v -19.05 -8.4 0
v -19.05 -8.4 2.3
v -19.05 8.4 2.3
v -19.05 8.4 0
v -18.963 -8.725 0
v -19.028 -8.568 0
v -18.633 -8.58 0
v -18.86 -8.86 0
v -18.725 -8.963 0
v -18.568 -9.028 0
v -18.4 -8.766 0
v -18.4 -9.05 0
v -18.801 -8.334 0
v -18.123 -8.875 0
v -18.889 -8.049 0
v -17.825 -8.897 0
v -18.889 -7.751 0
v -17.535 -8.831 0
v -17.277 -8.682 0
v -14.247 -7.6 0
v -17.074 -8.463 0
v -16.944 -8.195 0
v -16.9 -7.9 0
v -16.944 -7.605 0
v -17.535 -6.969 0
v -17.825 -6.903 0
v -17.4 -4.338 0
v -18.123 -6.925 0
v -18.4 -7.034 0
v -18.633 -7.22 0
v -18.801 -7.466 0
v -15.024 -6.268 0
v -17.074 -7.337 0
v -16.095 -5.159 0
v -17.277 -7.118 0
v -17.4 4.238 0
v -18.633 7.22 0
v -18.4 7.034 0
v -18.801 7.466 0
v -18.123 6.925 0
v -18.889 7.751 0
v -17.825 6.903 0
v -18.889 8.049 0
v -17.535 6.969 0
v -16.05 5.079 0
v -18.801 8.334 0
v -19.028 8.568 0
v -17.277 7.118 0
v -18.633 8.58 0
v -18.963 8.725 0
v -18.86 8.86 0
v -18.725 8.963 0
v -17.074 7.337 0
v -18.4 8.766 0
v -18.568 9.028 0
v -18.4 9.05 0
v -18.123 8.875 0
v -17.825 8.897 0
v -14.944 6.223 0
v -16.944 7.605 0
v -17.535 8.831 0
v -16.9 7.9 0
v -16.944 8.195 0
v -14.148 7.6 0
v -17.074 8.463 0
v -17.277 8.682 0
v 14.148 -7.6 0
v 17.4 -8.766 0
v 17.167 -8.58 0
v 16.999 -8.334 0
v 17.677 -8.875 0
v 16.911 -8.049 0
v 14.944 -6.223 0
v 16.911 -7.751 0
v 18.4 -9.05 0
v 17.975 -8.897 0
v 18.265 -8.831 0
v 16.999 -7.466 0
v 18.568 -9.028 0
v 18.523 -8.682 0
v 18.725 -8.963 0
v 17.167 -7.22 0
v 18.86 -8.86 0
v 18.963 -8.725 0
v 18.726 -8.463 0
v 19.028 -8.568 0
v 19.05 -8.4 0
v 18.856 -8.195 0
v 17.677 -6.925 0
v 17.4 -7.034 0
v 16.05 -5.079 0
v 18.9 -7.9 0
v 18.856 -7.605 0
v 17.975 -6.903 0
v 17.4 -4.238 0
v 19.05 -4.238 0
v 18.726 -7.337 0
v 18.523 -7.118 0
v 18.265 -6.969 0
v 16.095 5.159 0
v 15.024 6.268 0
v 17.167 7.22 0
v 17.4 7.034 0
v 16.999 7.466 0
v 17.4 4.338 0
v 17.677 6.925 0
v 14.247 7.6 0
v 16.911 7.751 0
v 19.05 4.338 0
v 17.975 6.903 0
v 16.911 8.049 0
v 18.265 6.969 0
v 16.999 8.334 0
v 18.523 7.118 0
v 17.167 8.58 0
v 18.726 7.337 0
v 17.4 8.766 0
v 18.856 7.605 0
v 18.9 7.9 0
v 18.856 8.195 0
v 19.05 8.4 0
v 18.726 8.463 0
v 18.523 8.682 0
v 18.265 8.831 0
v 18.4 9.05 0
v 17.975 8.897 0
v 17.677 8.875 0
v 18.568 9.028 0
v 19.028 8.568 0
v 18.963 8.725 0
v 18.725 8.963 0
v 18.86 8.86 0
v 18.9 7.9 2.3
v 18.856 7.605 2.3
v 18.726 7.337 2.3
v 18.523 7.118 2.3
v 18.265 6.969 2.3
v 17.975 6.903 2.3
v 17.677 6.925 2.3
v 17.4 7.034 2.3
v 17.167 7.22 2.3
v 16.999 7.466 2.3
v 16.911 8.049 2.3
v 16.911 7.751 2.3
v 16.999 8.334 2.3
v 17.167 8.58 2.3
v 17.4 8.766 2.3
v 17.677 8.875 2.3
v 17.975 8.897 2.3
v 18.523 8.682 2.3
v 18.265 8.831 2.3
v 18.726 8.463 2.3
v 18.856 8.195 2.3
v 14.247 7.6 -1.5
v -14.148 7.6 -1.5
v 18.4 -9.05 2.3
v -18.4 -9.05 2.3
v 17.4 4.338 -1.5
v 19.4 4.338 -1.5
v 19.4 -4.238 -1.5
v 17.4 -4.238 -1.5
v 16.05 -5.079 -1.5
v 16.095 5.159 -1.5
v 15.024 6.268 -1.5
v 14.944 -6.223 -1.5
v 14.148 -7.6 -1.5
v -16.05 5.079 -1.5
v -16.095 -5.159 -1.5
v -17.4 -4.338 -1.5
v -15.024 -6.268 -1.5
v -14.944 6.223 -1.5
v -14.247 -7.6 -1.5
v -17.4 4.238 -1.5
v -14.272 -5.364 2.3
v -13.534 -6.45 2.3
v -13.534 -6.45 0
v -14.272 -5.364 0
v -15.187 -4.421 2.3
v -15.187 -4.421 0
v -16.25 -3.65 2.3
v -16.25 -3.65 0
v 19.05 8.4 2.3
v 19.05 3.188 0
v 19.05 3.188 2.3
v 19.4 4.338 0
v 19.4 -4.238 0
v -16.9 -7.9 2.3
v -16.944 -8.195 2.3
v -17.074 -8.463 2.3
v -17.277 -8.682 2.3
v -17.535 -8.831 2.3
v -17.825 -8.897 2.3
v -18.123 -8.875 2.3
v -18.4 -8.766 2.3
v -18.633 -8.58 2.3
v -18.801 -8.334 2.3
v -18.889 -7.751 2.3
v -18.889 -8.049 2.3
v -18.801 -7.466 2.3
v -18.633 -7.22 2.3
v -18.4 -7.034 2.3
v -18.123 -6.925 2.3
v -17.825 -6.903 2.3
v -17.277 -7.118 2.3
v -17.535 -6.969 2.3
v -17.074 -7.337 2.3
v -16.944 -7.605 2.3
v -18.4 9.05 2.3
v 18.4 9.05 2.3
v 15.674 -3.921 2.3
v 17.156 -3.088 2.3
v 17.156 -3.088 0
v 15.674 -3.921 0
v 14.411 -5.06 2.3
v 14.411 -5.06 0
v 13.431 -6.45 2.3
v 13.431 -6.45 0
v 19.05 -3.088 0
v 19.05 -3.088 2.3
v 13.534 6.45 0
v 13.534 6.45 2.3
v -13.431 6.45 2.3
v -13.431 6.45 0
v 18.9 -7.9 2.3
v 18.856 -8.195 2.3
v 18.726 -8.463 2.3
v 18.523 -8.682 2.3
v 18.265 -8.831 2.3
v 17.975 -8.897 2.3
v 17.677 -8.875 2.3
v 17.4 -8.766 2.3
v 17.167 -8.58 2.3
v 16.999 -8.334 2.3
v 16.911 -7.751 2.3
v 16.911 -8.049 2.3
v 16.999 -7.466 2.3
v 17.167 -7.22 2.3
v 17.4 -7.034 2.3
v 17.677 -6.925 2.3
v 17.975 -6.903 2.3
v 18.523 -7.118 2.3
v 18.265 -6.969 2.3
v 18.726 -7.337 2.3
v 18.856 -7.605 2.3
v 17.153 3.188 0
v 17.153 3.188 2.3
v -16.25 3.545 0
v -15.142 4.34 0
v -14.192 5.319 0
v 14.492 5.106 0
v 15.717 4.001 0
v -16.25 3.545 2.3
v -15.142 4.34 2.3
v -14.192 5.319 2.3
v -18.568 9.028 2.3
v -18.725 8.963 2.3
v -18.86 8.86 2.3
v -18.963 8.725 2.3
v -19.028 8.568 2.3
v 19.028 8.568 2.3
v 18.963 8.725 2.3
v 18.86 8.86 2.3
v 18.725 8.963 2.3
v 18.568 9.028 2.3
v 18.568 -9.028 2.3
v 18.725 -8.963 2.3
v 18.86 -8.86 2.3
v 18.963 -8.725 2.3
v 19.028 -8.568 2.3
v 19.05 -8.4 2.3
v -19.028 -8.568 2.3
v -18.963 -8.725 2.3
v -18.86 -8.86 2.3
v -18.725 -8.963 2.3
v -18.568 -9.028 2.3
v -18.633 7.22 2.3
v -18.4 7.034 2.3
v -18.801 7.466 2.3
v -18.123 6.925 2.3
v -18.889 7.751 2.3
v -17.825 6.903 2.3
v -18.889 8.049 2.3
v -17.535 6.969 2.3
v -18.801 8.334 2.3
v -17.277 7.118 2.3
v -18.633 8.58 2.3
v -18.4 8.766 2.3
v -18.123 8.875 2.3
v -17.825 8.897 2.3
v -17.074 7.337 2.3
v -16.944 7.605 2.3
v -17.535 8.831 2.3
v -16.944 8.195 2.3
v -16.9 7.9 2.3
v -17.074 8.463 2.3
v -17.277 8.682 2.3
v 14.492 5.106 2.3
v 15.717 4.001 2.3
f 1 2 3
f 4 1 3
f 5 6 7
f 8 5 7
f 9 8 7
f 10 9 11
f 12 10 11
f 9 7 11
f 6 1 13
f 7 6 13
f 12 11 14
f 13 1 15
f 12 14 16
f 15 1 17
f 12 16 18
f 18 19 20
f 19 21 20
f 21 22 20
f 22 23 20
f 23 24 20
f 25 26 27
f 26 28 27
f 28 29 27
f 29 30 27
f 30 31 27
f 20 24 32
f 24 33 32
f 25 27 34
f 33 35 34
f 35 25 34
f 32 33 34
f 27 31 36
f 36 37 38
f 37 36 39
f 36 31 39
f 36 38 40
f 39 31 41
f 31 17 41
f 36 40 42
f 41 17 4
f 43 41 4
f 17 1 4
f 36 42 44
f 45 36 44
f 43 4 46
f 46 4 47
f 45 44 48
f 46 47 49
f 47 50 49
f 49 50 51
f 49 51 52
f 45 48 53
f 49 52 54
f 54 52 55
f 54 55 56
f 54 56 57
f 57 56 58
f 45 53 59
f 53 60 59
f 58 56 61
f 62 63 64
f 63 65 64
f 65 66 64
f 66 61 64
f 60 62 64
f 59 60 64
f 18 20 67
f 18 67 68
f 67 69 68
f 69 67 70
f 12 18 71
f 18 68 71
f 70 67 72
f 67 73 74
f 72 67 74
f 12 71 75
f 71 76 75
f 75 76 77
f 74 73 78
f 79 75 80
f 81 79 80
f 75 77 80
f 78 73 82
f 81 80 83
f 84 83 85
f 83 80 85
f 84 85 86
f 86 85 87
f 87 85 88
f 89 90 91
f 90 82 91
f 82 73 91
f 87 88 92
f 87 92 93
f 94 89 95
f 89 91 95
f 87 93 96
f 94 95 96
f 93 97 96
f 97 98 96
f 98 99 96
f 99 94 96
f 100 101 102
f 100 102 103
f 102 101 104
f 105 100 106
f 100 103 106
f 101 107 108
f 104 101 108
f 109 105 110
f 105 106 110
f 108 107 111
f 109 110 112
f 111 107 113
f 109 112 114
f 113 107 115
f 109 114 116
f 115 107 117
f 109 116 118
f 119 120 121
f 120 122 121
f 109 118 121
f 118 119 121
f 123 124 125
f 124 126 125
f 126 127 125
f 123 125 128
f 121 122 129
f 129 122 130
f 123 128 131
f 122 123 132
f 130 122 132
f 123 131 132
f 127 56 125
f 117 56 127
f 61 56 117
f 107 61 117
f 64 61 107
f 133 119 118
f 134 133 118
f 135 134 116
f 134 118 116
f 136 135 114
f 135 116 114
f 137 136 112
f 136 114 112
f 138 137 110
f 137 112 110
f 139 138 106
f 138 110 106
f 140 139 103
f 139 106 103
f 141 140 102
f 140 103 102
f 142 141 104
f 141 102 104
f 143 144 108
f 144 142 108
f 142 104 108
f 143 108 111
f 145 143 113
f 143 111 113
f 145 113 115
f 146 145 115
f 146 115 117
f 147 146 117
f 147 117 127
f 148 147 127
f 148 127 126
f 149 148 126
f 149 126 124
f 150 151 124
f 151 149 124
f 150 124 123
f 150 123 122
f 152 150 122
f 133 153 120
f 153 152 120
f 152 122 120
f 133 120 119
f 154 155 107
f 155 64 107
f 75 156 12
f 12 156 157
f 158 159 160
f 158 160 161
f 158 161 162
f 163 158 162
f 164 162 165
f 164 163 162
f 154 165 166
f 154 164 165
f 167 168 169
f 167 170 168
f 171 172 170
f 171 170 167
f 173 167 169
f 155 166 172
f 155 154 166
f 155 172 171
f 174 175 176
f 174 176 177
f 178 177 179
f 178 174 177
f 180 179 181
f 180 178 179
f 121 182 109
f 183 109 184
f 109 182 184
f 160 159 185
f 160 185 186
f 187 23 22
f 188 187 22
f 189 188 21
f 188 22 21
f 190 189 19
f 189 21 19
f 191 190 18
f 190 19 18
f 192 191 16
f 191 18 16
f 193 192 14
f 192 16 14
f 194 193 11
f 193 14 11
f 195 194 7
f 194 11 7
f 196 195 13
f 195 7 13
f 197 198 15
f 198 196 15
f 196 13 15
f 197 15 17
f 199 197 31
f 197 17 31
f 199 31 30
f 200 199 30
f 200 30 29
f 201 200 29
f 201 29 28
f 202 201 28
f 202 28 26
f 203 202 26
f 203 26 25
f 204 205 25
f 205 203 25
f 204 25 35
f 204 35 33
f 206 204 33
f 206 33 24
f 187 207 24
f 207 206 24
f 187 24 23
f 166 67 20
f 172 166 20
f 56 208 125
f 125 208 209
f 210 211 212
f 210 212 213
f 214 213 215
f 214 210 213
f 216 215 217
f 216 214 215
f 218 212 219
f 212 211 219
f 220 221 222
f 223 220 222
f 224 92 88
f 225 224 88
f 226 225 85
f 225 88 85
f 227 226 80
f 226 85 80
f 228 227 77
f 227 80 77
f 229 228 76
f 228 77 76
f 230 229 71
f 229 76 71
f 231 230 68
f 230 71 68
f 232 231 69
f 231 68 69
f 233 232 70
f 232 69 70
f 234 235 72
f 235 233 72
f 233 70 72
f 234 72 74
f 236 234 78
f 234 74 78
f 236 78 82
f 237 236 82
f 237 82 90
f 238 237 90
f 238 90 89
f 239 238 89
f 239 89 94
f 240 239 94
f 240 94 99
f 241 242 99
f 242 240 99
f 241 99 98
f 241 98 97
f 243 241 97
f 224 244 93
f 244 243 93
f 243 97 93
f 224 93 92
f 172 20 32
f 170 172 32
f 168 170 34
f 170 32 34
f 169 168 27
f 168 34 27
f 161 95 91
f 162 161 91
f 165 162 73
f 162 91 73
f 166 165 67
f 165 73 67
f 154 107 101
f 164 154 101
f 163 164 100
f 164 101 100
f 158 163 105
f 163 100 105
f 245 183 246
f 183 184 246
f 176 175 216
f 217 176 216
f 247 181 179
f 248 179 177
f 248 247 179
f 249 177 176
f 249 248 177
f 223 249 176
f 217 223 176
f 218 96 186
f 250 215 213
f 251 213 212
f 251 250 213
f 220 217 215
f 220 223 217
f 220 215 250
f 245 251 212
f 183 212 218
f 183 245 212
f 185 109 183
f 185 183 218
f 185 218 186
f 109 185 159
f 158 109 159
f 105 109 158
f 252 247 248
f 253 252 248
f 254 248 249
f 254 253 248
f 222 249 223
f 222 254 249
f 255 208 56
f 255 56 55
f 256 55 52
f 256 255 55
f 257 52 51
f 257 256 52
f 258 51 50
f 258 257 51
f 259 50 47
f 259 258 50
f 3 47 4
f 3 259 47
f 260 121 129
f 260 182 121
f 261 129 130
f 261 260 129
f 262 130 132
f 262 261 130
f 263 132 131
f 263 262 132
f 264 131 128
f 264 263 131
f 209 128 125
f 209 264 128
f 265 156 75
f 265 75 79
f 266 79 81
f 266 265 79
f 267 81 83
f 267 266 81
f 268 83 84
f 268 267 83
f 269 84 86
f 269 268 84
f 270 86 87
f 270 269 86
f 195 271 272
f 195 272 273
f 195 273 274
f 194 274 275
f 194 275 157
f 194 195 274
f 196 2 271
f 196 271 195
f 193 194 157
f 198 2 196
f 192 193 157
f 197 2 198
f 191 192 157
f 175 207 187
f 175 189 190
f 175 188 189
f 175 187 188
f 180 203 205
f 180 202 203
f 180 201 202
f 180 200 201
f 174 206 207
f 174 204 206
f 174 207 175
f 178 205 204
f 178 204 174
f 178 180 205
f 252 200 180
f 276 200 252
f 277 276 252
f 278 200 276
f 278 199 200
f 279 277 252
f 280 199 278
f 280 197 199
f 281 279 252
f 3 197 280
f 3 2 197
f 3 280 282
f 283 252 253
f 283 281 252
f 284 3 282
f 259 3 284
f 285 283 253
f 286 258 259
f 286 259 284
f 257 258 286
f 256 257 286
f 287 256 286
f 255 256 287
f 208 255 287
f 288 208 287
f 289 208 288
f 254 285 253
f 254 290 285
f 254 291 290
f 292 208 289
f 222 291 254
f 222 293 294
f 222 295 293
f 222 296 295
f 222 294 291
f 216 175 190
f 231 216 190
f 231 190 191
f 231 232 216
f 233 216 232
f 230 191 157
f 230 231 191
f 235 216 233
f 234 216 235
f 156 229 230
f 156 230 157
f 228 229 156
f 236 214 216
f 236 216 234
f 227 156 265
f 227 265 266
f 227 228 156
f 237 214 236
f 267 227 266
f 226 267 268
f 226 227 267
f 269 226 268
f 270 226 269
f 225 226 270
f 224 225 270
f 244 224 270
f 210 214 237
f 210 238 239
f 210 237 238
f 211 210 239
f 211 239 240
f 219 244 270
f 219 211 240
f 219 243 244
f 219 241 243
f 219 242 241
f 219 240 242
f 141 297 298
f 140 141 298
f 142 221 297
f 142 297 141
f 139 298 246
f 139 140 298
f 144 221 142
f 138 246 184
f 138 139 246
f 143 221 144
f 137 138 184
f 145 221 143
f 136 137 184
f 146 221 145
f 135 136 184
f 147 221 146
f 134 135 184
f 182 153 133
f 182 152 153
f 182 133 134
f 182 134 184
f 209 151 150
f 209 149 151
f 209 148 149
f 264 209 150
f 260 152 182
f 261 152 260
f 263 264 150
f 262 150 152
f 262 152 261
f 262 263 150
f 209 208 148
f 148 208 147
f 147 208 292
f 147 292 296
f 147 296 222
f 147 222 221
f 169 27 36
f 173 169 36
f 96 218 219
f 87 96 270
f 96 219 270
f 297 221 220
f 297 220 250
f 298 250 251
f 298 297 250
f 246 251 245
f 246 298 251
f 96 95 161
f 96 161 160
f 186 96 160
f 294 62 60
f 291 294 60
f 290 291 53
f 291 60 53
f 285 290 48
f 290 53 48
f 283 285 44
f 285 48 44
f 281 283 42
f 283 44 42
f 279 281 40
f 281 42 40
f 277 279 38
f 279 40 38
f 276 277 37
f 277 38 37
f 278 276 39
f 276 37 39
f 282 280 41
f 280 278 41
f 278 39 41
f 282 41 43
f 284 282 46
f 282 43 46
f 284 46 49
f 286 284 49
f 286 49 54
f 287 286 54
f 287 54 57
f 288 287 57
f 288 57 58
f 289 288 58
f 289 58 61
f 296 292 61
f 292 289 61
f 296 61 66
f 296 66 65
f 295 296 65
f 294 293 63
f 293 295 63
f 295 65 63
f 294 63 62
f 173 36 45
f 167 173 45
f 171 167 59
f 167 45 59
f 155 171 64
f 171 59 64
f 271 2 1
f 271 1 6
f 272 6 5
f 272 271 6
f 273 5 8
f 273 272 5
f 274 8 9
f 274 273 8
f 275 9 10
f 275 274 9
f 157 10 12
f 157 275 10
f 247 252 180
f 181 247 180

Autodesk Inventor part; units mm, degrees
ref_plane "YZ Plane" through (0, 0, 0) normal (1, 0, 0) x (0, 1, 0)
ref_plane "XZ Plane" through (0, 0, 0) normal (0, 1, 0) x (-1, 0, 0)
sketch "Sketch1" plane through (0, 0, 0) normal (0, 0, 1) x (1, 0, 0)
  line L0 (17.4, 4.3375) -> (19.4, 4.3375) projected
  line L1 (19.4, 8.4) -> (19.4, 4.3375) projected
  arc A0 (19.4, 8.4) -> (18.4, 9.4) centre (18.4, 8.4) ccw projected
  line L2 (-18.4, 9.4) -> (18.4, 9.4) projected
  arc A1 (-18.4, 9.4) -> (-19.4, 8.4) centre (-18.4, 8.4) ccw projected
  line L3 (-19.4, -8.4) -> (-19.4, 8.4) projected
  arc A2 (-19.4, -8.4) -> (-18.4, -9.4) centre (-18.4, -8.4) ccw projected
  line L4 (18.4, -9.4) -> (-18.4, -9.4) projected
  arc A3 (18.4, -9.4) -> (19.4, -8.4) centre (18.4, -8.4) ccw projected
  line L5 (19.4, -4.2375) -> (19.4, -8.4) projected
  line L6 (19.4, -4.2375) -> (17.4, -4.2375) projected
  arc A4 (17.4, -4.2375) -> (14.1485, -7.6) centre (20.15, -10.15) ccw projected
  line L7 (14.1485, -7.6) -> (-14.247, -7.6) projected
  arc A5 (-14.247, -7.6) -> (-17.4, -4.3375) centre (-20.15, -10.15) ccw projected
  line L8 (-17.4, -4.3375) -> (-17.4, 4.2375) projected
  arc A6 (-17.4, 4.2375) -> (-14.1485, 7.6) centre (-20.15, 10.15) ccw projected
  line L9 (-14.1485, 7.6) -> (14.247, 7.6) projected
  arc A7 (14.247, 7.6) -> (17.4, 4.3375) centre (20.15, 10.15) ccw projected
  circle A8 centre (-17.9, -7.9) radius 1 projected
  circle A9 centre (17.9, -7.9) radius 1 projected
  circle A10 centre (-17.9, 7.9) radius 1 projected
  circle A11 centre (17.9, 7.9) radius 1 projected
  line L10 (19.4, -2.5) -> (19.4, 2.5) projected
  line L11 (19.4, 8.4) -> (19.4, 2.5) projected
  line L12 (19.4, -2.5) -> (19.4, -8.4) projected
  point P0 (0, 0)
ref_plane "Work Plane1" through (-26.7016, -22.7609, 2.3) normal (0, 0, 1) x (1, 0, 0)
extrude "Extrusion1" add sketch "Sketch1" along normal up to surface (2.3 mm away) contours A7 L9 A6 L8 A5 L7 A4 L6 L5 A3 L4 A2 L3 A1 L2 A0 L1 L0
sketch "Sketch2" plane through (0, 0, 0) normal (0, 0, -1) x (-1, 0, 0)
  arc A0 (14.1485, 7.6) -> (17.4, 4.2375) centre (20.15, 10.15) ccw projected
  line L0 (17.4, -4.3375) -> (17.4, 4.2375) projected
  arc A1 (17.4, -4.3375) -> (14.247, -7.6) centre (20.15, -10.15) ccw projected
  line L1 (-14.1485, -7.6) -> (14.247, -7.6) projected
  arc A2 (-14.1485, -7.6) -> (-17.4, -4.2375) centre (-20.15, -10.15) ccw projected
  line L2 (-17.4, -4.2375) -> (-19.4, -4.2375) projected
  line L3 (-19.4, -4.2375) -> (-19.4, 4.3375) projected
  line L4 (-19.4, 4.3375) -> (-17.4, 4.3375) projected
  arc A3 (-17.4, 4.3375) -> (-14.247, 7.6) centre (-20.15, 10.15) ccw projected
  line L5 (14.1485, 7.6) -> (-14.247, 7.6) projected
  point P0 (0, 0)
extrude "Extrusion2" add sketch "Sketch2" along normal blind 1.5
sketch "Sketch3" plane through (0, 0, 0) normal (0, 0, 1) x (1, 0, 0)
  line L0 (19.4, 4.3375) -> (19.4, -4.2375) projected
  line L1 (17.4, 4.3375) -> (19.4, 4.3375) projected
  arc A0 (14.247, 7.6) -> (17.4, 4.3375) centre (20.15, 10.15) ccw projected
  line L2 (-14.1485, 7.6) -> (14.247, 7.6) projected
  arc A1 (-17.4, 4.2375) -> (-14.1485, 7.6) centre (-20.15, 10.15) ccw projected
  line L3 (-17.4, -4.3375) -> (-17.4, 4.2375) projected
  arc A2 (-14.247, -7.6) -> (-17.4, -4.3375) centre (-20.15, -10.15) ccw projected
  line L4 (14.1485, -7.6) -> (-14.247, -7.6) projected
  arc A3 (17.4, -4.2375) -> (14.1485, -7.6) centre (20.15, -10.15) ccw projected
  line L5 (19.4, -4.2375) -> (17.4, -4.2375) projected
  arc A4 (13.332, 6.1) -> (17.0815, 2.8375) centre (20.15, 10.15) ccw
  line L6 (17.0815, 2.8375) -> (17.9, 2.8375)
  line L7 (17.9, 2.8375) -> (17.9, -2.7375)
  line L8 (17.9, -2.7375) -> (17.0861, -2.7375)
  arc A5 (17.0861, -2.7375) -> (13.2269, -6.1) centre (20.15, -10.15) ccw
  line L9 (13.2269, -6.1) -> (-13.332, -6.1)
  arc A6 (-13.332, -6.1) -> (-15.9, -3.4548) centre (-20.15, -10.15) ccw
  line L10 (-15.9, -3.4548) -> (-15.9, 3.3478)
  arc A7 (-15.9, 3.3478) -> (-13.2269, 6.1) centre (-20.15, 10.15) ccw
  line L11 (-13.2269, 6.1) -> (13.332, 6.1)
  line L12 (17.9, 2.8375) -> (19.4, 2.8375)
  line L13 (19.4, 2.8375) -> (19.4, -2.7375)
  line L14 (19.4, -2.7375) -> (17.9, -2.7375)
  line L15 (17.9, -2.7375) -> (17.9, 2.8375)
  point P0 (0, 0)
  dimension "d4" = 1.5
  dimension "d5" = 5.575
extrude "Extrusion3" add sketch "Sketch3" along normal up to surface (2.3 mm away) contours L0 L12 L6 A4 L11 A7 L10 A6 L9 A5 L8 L14 L5 A3 L4 A2 L3 A1 L2 A0 L1
sketch "Sketch4" plane through (-18.4, 9.4, 2.3) normal (0, 0, 1) x (1, 0, 0)
  line L0 (37.8, -12.1375) -> (37.8, -17.8) projected
  line L1 (35.4861, -12.1375) -> (37.8, -12.1375) projected
  arc A0 (35.4861, -12.1375) -> (31.6269, -15.5) centre (38.55, -19.55) ccw projected
  line L2 (5.068, -15.5) -> (31.6269, -15.5) projected
  arc A1 (5.068, -15.5) -> (2.5, -12.8548) centre (-1.75, -19.55) ccw projected
  line L3 (2.5, -6.0522) -> (2.5, -12.8548) projected
  arc A2 (2.5, -6.0522) -> (5.1731, -3.3) centre (-1.75, 0.75) ccw projected
  line L4 (31.732, -3.3) -> (5.1731, -3.3) projected
  arc A3 (31.732, -3.3) -> (35.4815, -6.5625) centre (38.55, 0.75) ccw projected
  line L5 (37.8, -6.5625) -> (35.4815, -6.5625) projected
  line L6 (37.8, -1) -> (37.8, -6.5625) projected
  arc A4 (37.8, -1) -> (36.8, 0) centre (36.8, -1) ccw projected
  line L7 (0, 0) -> (36.8, 0) projected
  arc A5 (0, 0) -> (-1, -1) centre (0, -1) ccw projected
  line L8 (-1, -17.8) -> (-1, -1) projected
  arc A6 (-1, -17.8) -> (0, -18.8) centre (0, -17.8) ccw projected
  line L9 (36.8, -18.8) -> (0, -18.8) projected
  arc A7 (36.8, -18.8) -> (37.8, -17.8) centre (36.8, -17.8) ccw projected
  arc A8 (37.45, -1) -> (36.8, -0.35) centre (36.8, -1) ccw
  line L10 (37.45, -1) -> (37.45, -6.2125)
  line L11 (37.45, -6.2125) -> (35.5528, -6.2125)
  arc A9 (31.9342, -2.95) -> (35.5528, -6.2125) centre (38.55, 0.75) ccw
  line L12 (31.9342, -2.95) -> (4.9694, -2.95)
  arc A10 (2.15, -5.8553) -> (4.9694, -2.95) centre (-1.75, 0.75) ccw
  line L13 (2.15, -5.8553) -> (2.15, -13.05)
  arc A11 (4.8658, -15.85) -> (2.15, -13.05) centre (-1.75, -19.55) ccw
  line L14 (4.8658, -15.85) -> (31.8306, -15.85)
  arc A12 (35.5564, -12.4875) -> (31.8306, -15.85) centre (38.55, -19.55) ccw
  line L15 (35.5564, -12.4875) -> (37.45, -12.4875)
  line L16 (37.45, -12.4875) -> (37.45, -17.8)
  arc A13 (36.8, -18.45) -> (37.45, -17.8) centre (36.8, -17.8) ccw
  line L17 (36.8, -18.45) -> (0, -18.45)
  arc A14 (-0.65, -17.8) -> (0, -18.45) centre (0, -17.8) ccw
  line L18 (-0.65, -17.8) -> (-0.65, -1)
  arc A15 (0, -0.35) -> (-0.65, -1) centre (0, -1) ccw
  line L19 (0, -0.35) -> (36.8, -0.35)
  line L20 (37.45, -6.2125) -> (37.45, -12.4875)
  line L21 (37.8, -6.5625) -> (37.8, -12.1375) projected
  line L22 (37.8, -6.2125) -> (37.8, -1)
  arc A16 (37.8, -1) -> (36.8, 0) centre (36.8, -1) ccw
  line L23 (36.8, 0) -> (0, 0)
  arc A17 (0, 0) -> (-1, -1) centre (0, -1) ccw
  line L24 (-1, -1) -> (-1, -17.8)
  arc A18 (-1, -17.8) -> (0, -18.8) centre (0, -17.8) ccw
  line L25 (0, -18.8) -> (36.8, -18.8)
  arc A19 (36.8, -18.8) -> (37.8, -17.8) centre (36.8, -17.8) ccw
  line L26 (37.8, -17.8) -> (37.8, -12.4875)
  line L27 (37.8, -6.2125) -> (37.8, -12.4875)
  line L28 (-1, 0) -> (37.8, 0)
  line L29 (37.8, 0) -> (37.8, -18.8)
  line L30 (37.8, -18.8) -> (-1, -18.8)
  line L31 (-1, -18.8) -> (-1, 0)
  line L32 (-0.65, -0.35) -> (37.45, -0.35)
  line L33 (37.45, -0.35) -> (37.45, -18.45)
  line L34 (37.45, -18.45) -> (-0.65, -18.45)
  line L35 (-0.65, -18.45) -> (-0.65, -0.35)
  point P0 (18.4, -9.4)
  dimension "d8" = 0.35
  dimension "d9" = 0
extrude "Extrusion4" cut sketch "Sketch4" against normal up to surface (2.3 mm away) contours L0 A7 L9 A6 L8 A5 L7 A4 L6 L5 L20 L10 L33 L32 L19 L35 L18 L34 L17 L16 L1 | L20 L15 A12 L14 A11 L13 A10 L12 A9 L11 L5 A3 L4 A2 L3 A1 L2 A0 L1 | L33 L34 A13 | A8 L32 L33 | L34 L35 A14 | A15 L35 L32
properties part number "contramoldetapasevo"
